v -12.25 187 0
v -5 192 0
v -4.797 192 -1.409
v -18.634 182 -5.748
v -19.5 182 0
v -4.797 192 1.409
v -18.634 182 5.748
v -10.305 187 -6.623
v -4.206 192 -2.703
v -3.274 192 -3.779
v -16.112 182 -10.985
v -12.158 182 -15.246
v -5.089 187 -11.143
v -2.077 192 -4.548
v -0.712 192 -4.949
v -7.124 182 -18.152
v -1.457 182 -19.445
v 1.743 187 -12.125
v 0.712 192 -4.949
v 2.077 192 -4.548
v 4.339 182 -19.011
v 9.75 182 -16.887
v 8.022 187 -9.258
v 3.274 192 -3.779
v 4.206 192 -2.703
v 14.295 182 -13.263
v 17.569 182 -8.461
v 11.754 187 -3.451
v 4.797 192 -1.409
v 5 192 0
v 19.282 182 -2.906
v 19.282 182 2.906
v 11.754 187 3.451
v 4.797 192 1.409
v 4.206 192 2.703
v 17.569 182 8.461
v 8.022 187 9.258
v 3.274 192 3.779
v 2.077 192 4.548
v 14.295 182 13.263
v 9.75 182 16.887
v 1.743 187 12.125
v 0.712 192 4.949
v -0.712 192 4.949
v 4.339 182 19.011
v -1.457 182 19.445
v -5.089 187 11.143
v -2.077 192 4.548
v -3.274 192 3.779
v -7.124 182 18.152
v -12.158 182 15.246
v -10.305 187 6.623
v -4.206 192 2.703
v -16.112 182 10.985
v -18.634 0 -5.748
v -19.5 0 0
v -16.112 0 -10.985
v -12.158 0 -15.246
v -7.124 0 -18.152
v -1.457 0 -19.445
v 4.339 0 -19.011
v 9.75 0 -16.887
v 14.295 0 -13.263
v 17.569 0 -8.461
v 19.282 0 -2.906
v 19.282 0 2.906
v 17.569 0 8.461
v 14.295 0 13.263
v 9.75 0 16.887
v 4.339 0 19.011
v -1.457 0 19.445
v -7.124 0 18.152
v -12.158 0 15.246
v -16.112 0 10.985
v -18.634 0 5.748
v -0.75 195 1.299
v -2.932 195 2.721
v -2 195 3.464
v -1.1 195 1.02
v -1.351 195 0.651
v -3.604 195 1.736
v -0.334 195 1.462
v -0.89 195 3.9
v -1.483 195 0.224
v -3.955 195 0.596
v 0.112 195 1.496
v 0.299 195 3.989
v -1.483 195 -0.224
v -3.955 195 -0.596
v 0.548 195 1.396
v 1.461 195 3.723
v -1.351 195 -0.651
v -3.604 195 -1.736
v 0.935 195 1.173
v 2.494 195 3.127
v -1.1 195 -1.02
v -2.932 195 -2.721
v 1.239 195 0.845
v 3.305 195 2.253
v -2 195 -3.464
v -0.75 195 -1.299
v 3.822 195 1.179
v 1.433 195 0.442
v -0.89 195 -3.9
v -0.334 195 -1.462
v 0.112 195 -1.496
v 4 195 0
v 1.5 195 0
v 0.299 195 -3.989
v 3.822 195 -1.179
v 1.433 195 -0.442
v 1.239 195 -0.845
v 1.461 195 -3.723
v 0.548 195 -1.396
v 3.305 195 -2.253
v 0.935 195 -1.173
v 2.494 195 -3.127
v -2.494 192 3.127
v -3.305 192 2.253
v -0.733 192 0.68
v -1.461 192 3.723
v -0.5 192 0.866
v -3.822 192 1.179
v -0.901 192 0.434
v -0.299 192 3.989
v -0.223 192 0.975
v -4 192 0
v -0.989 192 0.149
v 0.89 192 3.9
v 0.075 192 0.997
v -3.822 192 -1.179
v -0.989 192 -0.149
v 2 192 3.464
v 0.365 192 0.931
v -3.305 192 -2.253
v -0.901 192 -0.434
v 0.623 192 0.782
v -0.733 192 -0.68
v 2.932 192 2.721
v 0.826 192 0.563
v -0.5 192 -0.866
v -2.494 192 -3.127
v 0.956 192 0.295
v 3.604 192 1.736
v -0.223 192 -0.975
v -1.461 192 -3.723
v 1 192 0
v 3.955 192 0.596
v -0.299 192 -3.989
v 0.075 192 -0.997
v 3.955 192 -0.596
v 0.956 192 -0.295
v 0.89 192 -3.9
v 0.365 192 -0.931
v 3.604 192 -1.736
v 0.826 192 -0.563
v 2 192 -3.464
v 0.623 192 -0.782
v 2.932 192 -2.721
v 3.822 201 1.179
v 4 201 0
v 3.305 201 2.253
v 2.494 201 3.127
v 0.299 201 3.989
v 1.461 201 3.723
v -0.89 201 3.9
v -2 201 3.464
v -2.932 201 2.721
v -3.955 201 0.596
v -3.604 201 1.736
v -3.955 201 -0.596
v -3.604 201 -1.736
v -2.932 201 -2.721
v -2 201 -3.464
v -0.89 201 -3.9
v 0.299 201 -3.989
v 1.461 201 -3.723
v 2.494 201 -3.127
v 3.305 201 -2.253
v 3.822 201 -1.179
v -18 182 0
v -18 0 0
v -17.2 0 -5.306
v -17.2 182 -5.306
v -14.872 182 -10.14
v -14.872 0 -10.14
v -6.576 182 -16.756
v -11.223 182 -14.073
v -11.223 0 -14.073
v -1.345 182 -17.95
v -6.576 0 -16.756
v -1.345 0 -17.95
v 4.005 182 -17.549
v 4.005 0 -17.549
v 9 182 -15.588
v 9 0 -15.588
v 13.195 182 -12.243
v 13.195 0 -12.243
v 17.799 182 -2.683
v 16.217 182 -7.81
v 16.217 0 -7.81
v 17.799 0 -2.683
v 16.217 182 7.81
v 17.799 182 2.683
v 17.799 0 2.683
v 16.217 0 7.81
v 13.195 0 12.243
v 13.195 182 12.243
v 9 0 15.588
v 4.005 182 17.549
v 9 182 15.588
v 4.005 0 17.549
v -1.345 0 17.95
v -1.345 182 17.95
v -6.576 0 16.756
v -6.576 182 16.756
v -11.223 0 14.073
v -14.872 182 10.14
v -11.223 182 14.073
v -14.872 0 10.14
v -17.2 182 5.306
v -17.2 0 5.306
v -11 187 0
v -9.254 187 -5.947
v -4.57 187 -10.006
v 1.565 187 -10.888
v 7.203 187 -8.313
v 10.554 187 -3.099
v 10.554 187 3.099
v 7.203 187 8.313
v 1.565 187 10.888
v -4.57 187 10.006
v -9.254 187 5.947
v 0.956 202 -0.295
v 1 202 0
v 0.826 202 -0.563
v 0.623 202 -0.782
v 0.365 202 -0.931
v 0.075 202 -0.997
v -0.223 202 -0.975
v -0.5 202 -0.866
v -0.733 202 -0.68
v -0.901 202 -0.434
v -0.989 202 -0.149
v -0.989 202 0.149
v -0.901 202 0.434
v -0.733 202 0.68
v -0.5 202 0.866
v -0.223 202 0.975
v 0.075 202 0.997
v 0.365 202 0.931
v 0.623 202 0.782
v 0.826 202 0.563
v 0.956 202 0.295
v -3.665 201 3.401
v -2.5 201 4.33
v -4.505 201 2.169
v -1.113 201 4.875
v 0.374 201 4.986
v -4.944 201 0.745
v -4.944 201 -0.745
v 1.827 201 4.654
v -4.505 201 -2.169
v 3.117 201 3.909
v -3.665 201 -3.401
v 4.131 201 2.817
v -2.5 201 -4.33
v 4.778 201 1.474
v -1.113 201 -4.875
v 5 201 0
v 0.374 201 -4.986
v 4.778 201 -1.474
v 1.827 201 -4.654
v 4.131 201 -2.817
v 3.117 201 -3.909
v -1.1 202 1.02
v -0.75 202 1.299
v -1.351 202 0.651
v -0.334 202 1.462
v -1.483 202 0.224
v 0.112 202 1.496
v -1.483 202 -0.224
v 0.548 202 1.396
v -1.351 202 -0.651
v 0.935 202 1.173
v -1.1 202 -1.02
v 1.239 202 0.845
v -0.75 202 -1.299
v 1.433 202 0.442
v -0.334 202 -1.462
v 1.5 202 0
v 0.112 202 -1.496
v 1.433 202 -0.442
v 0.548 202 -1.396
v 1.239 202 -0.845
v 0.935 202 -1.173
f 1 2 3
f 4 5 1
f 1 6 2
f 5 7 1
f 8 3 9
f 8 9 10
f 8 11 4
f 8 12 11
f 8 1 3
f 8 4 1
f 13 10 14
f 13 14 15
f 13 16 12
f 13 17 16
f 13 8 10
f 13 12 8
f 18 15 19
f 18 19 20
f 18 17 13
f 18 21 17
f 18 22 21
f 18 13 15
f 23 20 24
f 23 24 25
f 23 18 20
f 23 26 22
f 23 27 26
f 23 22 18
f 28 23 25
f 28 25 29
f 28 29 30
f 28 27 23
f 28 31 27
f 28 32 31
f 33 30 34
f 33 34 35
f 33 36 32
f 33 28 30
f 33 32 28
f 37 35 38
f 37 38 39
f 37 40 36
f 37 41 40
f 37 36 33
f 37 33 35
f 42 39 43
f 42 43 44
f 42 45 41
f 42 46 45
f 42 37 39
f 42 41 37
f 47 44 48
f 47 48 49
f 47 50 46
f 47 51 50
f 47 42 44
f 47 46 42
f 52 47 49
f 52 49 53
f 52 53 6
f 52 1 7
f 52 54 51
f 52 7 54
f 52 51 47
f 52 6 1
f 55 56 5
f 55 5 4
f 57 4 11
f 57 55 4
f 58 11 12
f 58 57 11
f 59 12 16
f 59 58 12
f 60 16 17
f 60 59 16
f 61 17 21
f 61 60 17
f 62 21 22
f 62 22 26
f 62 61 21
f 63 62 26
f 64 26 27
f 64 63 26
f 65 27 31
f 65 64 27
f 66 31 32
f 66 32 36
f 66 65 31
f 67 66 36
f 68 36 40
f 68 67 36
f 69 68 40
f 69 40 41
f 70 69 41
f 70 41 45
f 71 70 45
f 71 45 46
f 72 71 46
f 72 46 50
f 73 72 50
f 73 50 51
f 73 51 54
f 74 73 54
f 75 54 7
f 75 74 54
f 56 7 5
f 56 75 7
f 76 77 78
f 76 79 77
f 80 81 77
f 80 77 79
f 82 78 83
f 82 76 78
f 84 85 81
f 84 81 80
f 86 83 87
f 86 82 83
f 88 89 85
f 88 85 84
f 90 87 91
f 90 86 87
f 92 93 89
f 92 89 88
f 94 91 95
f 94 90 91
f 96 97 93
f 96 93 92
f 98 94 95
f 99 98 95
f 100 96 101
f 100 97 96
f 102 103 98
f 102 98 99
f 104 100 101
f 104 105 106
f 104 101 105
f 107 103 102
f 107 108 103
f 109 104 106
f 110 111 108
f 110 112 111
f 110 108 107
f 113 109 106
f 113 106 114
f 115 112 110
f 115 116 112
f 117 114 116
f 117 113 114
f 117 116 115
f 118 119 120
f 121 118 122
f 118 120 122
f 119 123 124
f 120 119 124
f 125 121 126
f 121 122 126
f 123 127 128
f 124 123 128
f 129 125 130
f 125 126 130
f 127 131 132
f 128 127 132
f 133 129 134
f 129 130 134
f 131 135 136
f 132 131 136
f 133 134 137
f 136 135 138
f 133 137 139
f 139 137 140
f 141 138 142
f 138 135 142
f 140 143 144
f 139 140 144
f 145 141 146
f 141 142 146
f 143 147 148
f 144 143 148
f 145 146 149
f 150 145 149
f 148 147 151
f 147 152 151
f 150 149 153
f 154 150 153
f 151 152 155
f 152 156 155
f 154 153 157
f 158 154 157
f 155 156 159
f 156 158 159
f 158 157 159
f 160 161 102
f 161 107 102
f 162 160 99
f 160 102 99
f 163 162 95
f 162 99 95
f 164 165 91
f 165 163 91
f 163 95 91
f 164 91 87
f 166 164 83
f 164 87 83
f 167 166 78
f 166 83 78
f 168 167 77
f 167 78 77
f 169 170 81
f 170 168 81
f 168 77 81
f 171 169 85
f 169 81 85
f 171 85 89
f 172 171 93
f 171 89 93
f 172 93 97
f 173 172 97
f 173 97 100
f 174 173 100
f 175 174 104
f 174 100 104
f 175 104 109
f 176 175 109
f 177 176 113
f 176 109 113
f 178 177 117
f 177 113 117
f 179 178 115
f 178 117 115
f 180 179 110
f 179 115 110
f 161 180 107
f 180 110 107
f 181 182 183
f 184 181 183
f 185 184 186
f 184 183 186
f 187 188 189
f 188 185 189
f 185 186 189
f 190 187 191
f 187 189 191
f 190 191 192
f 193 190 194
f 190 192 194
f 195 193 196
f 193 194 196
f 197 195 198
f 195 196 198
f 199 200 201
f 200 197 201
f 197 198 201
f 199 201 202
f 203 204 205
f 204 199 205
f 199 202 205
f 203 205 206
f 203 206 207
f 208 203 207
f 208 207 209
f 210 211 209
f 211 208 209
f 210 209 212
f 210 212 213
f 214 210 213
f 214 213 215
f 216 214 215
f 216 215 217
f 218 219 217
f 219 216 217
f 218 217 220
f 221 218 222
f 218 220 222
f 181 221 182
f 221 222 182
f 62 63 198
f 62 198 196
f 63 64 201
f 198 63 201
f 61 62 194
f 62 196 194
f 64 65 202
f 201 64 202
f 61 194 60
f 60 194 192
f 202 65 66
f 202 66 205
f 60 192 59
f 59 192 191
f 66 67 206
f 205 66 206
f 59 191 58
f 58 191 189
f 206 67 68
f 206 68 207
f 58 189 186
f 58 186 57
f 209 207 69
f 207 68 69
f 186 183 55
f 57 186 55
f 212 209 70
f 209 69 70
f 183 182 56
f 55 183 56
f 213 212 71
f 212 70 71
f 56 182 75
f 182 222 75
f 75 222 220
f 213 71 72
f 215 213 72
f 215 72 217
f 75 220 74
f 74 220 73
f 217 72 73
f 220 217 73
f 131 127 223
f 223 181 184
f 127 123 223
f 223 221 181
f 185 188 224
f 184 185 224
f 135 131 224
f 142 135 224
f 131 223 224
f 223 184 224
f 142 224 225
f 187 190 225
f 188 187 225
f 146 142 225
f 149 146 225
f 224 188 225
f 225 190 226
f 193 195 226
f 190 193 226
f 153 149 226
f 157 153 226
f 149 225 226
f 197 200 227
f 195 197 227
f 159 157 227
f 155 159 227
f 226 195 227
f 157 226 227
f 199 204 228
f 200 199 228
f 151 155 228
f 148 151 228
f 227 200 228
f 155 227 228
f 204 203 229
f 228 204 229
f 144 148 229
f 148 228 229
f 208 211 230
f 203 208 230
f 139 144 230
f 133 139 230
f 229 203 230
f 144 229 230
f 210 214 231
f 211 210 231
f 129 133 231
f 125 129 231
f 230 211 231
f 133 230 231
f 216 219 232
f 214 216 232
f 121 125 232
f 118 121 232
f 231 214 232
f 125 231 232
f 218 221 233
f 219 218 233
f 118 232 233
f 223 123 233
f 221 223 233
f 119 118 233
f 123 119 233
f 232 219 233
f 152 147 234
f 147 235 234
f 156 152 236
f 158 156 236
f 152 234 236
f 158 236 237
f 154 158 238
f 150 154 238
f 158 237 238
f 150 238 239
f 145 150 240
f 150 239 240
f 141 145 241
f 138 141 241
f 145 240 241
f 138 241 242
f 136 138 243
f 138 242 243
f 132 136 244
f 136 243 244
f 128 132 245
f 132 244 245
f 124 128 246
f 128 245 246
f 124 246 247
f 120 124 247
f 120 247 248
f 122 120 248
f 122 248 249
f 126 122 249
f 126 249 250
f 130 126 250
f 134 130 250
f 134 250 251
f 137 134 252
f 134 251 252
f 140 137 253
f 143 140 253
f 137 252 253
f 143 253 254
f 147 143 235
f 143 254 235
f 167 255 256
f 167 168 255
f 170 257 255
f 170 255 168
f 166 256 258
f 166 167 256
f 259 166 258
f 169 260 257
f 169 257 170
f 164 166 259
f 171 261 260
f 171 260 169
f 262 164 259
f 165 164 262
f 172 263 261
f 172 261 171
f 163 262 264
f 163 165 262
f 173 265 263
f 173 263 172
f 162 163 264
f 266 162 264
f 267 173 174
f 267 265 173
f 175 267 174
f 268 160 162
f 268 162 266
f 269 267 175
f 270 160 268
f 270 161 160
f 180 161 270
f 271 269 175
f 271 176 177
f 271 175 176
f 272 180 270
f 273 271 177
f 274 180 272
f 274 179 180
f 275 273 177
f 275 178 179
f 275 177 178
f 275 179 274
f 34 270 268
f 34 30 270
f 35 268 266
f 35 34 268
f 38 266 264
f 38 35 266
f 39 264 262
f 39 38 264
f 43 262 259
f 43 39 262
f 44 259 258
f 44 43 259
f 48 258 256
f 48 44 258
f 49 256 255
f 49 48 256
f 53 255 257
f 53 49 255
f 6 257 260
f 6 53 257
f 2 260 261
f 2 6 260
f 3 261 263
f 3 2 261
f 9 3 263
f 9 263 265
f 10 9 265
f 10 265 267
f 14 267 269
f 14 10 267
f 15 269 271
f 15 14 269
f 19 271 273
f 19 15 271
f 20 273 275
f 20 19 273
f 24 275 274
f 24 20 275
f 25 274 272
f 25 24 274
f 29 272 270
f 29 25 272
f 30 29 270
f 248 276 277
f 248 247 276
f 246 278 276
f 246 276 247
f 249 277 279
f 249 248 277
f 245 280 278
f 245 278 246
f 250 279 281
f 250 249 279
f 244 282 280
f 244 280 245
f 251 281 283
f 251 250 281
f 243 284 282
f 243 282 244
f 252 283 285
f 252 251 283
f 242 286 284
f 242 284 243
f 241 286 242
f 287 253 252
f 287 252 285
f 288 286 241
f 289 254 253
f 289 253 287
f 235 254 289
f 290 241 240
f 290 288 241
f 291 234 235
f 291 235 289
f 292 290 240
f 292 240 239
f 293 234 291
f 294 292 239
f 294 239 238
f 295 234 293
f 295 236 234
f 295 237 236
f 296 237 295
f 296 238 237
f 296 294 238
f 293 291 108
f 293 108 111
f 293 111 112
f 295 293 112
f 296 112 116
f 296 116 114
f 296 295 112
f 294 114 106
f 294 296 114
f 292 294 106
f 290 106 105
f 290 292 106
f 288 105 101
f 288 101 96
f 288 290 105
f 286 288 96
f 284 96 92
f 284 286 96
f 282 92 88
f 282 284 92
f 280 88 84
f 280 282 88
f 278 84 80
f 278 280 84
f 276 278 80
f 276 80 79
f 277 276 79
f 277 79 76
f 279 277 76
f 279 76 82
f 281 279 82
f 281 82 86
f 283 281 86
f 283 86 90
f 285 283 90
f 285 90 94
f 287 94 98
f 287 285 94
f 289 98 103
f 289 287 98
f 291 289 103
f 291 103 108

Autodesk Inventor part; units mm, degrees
ref_plane "YZ Plane" through (0, 0, 0) normal (1, 0, 0) x (0, 1, 0)
ref_plane "XZ Plane" through (0, 0, 0) normal (0, 1, 0) x (-1, 0, 0)
sketch "Sketch1" plane through (0, 0, 0) normal (0, 1, 0) x (-1, 0, 0)
  circle A0 centre (0, 0) radius 19.5
  circle A1 centre (0, 0) radius 18
  dimension "d0" = 39
  dimension "d1" = 36
extrude "Extrusion1" add sketch "Sketch1" along normal blind 182
ref_plane "Work Plane1" through (0, 192, 0) normal (0, 1, 0) x (1, 0, 0)
sketch "Sketch2" plane through (0, 192, 0) normal (0, 1, 0) x (1, 0, 0)
  circle A0 centre (0, 0) radius 5
  dimension "d5" = 10
loft "Loft1" add profiles "Sketch2" section 1 edges at (19.5, 182, 0)
sketch "Sketch3" plane through (0, 192, 0) normal (0, 1, 0) x (1, 0, 0)
  circle A0 centre (0, 0) radius 4
  dimension "d11" = 8
loft "Loft2" cut profiles "Sketch3" section 1 edges at (18, 182, 0)
sketch "Sketch4" plane through (0, 192, 0) normal (0, 1, 0) x (1, 0, 0)
  circle A0 centre (0, 0) radius 5
  circle A1 centre (0, 0) radius 4
  circle A2 centre (0, 0) radius 5 projected
  dimension "d16" = 10
  dimension "d17" = 8
extrude "Extrusion2" add sketch "Sketch4" along normal blind 9
sketch "Sketch5" plane through (0, 192, 0) normal (0, 1, 0) x (1, 0, 0)
  circle A0 centre (0, 0) radius 4
  circle A1 centre (0, 0) radius 4 projected
ref_plane "Work Plane2" through (0, 202, 0) normal (0, 1, 0) x (1, 0, 0)
sketch "Sketch6" plane through (0, 202, 0) normal (0, 1, 0) x (1, 0, 0)
  circle A0 centre (0, 0) radius 1.5
  line L0 (1.5, 0) -> (-1.5, 0) construction
  dimension "d21" = 3
extrude "Extrusion3" add sketch "Sketch5" along normal blind 3
extrude "Extrusion4" add sketch "Sketch6" against normal up to surface (7 mm away)
sketch "Sketch8" plane through (0, 202, 0) normal (0, 1, 0) x (1, 0, 0)
  circle A0 centre (0, 0) radius 1.5 projected
  circle A1 centre (0, 0) radius 1
  dimension "d26" = 2
extrude "Extrusion5" cut sketch "Sketch8" against normal through all contours A1
thread "Thread1" size "M39x2" class "6g" standard "ANSI Metric M Profile" length 16
properties part number "xilanh" material "PMMA Plastic"
